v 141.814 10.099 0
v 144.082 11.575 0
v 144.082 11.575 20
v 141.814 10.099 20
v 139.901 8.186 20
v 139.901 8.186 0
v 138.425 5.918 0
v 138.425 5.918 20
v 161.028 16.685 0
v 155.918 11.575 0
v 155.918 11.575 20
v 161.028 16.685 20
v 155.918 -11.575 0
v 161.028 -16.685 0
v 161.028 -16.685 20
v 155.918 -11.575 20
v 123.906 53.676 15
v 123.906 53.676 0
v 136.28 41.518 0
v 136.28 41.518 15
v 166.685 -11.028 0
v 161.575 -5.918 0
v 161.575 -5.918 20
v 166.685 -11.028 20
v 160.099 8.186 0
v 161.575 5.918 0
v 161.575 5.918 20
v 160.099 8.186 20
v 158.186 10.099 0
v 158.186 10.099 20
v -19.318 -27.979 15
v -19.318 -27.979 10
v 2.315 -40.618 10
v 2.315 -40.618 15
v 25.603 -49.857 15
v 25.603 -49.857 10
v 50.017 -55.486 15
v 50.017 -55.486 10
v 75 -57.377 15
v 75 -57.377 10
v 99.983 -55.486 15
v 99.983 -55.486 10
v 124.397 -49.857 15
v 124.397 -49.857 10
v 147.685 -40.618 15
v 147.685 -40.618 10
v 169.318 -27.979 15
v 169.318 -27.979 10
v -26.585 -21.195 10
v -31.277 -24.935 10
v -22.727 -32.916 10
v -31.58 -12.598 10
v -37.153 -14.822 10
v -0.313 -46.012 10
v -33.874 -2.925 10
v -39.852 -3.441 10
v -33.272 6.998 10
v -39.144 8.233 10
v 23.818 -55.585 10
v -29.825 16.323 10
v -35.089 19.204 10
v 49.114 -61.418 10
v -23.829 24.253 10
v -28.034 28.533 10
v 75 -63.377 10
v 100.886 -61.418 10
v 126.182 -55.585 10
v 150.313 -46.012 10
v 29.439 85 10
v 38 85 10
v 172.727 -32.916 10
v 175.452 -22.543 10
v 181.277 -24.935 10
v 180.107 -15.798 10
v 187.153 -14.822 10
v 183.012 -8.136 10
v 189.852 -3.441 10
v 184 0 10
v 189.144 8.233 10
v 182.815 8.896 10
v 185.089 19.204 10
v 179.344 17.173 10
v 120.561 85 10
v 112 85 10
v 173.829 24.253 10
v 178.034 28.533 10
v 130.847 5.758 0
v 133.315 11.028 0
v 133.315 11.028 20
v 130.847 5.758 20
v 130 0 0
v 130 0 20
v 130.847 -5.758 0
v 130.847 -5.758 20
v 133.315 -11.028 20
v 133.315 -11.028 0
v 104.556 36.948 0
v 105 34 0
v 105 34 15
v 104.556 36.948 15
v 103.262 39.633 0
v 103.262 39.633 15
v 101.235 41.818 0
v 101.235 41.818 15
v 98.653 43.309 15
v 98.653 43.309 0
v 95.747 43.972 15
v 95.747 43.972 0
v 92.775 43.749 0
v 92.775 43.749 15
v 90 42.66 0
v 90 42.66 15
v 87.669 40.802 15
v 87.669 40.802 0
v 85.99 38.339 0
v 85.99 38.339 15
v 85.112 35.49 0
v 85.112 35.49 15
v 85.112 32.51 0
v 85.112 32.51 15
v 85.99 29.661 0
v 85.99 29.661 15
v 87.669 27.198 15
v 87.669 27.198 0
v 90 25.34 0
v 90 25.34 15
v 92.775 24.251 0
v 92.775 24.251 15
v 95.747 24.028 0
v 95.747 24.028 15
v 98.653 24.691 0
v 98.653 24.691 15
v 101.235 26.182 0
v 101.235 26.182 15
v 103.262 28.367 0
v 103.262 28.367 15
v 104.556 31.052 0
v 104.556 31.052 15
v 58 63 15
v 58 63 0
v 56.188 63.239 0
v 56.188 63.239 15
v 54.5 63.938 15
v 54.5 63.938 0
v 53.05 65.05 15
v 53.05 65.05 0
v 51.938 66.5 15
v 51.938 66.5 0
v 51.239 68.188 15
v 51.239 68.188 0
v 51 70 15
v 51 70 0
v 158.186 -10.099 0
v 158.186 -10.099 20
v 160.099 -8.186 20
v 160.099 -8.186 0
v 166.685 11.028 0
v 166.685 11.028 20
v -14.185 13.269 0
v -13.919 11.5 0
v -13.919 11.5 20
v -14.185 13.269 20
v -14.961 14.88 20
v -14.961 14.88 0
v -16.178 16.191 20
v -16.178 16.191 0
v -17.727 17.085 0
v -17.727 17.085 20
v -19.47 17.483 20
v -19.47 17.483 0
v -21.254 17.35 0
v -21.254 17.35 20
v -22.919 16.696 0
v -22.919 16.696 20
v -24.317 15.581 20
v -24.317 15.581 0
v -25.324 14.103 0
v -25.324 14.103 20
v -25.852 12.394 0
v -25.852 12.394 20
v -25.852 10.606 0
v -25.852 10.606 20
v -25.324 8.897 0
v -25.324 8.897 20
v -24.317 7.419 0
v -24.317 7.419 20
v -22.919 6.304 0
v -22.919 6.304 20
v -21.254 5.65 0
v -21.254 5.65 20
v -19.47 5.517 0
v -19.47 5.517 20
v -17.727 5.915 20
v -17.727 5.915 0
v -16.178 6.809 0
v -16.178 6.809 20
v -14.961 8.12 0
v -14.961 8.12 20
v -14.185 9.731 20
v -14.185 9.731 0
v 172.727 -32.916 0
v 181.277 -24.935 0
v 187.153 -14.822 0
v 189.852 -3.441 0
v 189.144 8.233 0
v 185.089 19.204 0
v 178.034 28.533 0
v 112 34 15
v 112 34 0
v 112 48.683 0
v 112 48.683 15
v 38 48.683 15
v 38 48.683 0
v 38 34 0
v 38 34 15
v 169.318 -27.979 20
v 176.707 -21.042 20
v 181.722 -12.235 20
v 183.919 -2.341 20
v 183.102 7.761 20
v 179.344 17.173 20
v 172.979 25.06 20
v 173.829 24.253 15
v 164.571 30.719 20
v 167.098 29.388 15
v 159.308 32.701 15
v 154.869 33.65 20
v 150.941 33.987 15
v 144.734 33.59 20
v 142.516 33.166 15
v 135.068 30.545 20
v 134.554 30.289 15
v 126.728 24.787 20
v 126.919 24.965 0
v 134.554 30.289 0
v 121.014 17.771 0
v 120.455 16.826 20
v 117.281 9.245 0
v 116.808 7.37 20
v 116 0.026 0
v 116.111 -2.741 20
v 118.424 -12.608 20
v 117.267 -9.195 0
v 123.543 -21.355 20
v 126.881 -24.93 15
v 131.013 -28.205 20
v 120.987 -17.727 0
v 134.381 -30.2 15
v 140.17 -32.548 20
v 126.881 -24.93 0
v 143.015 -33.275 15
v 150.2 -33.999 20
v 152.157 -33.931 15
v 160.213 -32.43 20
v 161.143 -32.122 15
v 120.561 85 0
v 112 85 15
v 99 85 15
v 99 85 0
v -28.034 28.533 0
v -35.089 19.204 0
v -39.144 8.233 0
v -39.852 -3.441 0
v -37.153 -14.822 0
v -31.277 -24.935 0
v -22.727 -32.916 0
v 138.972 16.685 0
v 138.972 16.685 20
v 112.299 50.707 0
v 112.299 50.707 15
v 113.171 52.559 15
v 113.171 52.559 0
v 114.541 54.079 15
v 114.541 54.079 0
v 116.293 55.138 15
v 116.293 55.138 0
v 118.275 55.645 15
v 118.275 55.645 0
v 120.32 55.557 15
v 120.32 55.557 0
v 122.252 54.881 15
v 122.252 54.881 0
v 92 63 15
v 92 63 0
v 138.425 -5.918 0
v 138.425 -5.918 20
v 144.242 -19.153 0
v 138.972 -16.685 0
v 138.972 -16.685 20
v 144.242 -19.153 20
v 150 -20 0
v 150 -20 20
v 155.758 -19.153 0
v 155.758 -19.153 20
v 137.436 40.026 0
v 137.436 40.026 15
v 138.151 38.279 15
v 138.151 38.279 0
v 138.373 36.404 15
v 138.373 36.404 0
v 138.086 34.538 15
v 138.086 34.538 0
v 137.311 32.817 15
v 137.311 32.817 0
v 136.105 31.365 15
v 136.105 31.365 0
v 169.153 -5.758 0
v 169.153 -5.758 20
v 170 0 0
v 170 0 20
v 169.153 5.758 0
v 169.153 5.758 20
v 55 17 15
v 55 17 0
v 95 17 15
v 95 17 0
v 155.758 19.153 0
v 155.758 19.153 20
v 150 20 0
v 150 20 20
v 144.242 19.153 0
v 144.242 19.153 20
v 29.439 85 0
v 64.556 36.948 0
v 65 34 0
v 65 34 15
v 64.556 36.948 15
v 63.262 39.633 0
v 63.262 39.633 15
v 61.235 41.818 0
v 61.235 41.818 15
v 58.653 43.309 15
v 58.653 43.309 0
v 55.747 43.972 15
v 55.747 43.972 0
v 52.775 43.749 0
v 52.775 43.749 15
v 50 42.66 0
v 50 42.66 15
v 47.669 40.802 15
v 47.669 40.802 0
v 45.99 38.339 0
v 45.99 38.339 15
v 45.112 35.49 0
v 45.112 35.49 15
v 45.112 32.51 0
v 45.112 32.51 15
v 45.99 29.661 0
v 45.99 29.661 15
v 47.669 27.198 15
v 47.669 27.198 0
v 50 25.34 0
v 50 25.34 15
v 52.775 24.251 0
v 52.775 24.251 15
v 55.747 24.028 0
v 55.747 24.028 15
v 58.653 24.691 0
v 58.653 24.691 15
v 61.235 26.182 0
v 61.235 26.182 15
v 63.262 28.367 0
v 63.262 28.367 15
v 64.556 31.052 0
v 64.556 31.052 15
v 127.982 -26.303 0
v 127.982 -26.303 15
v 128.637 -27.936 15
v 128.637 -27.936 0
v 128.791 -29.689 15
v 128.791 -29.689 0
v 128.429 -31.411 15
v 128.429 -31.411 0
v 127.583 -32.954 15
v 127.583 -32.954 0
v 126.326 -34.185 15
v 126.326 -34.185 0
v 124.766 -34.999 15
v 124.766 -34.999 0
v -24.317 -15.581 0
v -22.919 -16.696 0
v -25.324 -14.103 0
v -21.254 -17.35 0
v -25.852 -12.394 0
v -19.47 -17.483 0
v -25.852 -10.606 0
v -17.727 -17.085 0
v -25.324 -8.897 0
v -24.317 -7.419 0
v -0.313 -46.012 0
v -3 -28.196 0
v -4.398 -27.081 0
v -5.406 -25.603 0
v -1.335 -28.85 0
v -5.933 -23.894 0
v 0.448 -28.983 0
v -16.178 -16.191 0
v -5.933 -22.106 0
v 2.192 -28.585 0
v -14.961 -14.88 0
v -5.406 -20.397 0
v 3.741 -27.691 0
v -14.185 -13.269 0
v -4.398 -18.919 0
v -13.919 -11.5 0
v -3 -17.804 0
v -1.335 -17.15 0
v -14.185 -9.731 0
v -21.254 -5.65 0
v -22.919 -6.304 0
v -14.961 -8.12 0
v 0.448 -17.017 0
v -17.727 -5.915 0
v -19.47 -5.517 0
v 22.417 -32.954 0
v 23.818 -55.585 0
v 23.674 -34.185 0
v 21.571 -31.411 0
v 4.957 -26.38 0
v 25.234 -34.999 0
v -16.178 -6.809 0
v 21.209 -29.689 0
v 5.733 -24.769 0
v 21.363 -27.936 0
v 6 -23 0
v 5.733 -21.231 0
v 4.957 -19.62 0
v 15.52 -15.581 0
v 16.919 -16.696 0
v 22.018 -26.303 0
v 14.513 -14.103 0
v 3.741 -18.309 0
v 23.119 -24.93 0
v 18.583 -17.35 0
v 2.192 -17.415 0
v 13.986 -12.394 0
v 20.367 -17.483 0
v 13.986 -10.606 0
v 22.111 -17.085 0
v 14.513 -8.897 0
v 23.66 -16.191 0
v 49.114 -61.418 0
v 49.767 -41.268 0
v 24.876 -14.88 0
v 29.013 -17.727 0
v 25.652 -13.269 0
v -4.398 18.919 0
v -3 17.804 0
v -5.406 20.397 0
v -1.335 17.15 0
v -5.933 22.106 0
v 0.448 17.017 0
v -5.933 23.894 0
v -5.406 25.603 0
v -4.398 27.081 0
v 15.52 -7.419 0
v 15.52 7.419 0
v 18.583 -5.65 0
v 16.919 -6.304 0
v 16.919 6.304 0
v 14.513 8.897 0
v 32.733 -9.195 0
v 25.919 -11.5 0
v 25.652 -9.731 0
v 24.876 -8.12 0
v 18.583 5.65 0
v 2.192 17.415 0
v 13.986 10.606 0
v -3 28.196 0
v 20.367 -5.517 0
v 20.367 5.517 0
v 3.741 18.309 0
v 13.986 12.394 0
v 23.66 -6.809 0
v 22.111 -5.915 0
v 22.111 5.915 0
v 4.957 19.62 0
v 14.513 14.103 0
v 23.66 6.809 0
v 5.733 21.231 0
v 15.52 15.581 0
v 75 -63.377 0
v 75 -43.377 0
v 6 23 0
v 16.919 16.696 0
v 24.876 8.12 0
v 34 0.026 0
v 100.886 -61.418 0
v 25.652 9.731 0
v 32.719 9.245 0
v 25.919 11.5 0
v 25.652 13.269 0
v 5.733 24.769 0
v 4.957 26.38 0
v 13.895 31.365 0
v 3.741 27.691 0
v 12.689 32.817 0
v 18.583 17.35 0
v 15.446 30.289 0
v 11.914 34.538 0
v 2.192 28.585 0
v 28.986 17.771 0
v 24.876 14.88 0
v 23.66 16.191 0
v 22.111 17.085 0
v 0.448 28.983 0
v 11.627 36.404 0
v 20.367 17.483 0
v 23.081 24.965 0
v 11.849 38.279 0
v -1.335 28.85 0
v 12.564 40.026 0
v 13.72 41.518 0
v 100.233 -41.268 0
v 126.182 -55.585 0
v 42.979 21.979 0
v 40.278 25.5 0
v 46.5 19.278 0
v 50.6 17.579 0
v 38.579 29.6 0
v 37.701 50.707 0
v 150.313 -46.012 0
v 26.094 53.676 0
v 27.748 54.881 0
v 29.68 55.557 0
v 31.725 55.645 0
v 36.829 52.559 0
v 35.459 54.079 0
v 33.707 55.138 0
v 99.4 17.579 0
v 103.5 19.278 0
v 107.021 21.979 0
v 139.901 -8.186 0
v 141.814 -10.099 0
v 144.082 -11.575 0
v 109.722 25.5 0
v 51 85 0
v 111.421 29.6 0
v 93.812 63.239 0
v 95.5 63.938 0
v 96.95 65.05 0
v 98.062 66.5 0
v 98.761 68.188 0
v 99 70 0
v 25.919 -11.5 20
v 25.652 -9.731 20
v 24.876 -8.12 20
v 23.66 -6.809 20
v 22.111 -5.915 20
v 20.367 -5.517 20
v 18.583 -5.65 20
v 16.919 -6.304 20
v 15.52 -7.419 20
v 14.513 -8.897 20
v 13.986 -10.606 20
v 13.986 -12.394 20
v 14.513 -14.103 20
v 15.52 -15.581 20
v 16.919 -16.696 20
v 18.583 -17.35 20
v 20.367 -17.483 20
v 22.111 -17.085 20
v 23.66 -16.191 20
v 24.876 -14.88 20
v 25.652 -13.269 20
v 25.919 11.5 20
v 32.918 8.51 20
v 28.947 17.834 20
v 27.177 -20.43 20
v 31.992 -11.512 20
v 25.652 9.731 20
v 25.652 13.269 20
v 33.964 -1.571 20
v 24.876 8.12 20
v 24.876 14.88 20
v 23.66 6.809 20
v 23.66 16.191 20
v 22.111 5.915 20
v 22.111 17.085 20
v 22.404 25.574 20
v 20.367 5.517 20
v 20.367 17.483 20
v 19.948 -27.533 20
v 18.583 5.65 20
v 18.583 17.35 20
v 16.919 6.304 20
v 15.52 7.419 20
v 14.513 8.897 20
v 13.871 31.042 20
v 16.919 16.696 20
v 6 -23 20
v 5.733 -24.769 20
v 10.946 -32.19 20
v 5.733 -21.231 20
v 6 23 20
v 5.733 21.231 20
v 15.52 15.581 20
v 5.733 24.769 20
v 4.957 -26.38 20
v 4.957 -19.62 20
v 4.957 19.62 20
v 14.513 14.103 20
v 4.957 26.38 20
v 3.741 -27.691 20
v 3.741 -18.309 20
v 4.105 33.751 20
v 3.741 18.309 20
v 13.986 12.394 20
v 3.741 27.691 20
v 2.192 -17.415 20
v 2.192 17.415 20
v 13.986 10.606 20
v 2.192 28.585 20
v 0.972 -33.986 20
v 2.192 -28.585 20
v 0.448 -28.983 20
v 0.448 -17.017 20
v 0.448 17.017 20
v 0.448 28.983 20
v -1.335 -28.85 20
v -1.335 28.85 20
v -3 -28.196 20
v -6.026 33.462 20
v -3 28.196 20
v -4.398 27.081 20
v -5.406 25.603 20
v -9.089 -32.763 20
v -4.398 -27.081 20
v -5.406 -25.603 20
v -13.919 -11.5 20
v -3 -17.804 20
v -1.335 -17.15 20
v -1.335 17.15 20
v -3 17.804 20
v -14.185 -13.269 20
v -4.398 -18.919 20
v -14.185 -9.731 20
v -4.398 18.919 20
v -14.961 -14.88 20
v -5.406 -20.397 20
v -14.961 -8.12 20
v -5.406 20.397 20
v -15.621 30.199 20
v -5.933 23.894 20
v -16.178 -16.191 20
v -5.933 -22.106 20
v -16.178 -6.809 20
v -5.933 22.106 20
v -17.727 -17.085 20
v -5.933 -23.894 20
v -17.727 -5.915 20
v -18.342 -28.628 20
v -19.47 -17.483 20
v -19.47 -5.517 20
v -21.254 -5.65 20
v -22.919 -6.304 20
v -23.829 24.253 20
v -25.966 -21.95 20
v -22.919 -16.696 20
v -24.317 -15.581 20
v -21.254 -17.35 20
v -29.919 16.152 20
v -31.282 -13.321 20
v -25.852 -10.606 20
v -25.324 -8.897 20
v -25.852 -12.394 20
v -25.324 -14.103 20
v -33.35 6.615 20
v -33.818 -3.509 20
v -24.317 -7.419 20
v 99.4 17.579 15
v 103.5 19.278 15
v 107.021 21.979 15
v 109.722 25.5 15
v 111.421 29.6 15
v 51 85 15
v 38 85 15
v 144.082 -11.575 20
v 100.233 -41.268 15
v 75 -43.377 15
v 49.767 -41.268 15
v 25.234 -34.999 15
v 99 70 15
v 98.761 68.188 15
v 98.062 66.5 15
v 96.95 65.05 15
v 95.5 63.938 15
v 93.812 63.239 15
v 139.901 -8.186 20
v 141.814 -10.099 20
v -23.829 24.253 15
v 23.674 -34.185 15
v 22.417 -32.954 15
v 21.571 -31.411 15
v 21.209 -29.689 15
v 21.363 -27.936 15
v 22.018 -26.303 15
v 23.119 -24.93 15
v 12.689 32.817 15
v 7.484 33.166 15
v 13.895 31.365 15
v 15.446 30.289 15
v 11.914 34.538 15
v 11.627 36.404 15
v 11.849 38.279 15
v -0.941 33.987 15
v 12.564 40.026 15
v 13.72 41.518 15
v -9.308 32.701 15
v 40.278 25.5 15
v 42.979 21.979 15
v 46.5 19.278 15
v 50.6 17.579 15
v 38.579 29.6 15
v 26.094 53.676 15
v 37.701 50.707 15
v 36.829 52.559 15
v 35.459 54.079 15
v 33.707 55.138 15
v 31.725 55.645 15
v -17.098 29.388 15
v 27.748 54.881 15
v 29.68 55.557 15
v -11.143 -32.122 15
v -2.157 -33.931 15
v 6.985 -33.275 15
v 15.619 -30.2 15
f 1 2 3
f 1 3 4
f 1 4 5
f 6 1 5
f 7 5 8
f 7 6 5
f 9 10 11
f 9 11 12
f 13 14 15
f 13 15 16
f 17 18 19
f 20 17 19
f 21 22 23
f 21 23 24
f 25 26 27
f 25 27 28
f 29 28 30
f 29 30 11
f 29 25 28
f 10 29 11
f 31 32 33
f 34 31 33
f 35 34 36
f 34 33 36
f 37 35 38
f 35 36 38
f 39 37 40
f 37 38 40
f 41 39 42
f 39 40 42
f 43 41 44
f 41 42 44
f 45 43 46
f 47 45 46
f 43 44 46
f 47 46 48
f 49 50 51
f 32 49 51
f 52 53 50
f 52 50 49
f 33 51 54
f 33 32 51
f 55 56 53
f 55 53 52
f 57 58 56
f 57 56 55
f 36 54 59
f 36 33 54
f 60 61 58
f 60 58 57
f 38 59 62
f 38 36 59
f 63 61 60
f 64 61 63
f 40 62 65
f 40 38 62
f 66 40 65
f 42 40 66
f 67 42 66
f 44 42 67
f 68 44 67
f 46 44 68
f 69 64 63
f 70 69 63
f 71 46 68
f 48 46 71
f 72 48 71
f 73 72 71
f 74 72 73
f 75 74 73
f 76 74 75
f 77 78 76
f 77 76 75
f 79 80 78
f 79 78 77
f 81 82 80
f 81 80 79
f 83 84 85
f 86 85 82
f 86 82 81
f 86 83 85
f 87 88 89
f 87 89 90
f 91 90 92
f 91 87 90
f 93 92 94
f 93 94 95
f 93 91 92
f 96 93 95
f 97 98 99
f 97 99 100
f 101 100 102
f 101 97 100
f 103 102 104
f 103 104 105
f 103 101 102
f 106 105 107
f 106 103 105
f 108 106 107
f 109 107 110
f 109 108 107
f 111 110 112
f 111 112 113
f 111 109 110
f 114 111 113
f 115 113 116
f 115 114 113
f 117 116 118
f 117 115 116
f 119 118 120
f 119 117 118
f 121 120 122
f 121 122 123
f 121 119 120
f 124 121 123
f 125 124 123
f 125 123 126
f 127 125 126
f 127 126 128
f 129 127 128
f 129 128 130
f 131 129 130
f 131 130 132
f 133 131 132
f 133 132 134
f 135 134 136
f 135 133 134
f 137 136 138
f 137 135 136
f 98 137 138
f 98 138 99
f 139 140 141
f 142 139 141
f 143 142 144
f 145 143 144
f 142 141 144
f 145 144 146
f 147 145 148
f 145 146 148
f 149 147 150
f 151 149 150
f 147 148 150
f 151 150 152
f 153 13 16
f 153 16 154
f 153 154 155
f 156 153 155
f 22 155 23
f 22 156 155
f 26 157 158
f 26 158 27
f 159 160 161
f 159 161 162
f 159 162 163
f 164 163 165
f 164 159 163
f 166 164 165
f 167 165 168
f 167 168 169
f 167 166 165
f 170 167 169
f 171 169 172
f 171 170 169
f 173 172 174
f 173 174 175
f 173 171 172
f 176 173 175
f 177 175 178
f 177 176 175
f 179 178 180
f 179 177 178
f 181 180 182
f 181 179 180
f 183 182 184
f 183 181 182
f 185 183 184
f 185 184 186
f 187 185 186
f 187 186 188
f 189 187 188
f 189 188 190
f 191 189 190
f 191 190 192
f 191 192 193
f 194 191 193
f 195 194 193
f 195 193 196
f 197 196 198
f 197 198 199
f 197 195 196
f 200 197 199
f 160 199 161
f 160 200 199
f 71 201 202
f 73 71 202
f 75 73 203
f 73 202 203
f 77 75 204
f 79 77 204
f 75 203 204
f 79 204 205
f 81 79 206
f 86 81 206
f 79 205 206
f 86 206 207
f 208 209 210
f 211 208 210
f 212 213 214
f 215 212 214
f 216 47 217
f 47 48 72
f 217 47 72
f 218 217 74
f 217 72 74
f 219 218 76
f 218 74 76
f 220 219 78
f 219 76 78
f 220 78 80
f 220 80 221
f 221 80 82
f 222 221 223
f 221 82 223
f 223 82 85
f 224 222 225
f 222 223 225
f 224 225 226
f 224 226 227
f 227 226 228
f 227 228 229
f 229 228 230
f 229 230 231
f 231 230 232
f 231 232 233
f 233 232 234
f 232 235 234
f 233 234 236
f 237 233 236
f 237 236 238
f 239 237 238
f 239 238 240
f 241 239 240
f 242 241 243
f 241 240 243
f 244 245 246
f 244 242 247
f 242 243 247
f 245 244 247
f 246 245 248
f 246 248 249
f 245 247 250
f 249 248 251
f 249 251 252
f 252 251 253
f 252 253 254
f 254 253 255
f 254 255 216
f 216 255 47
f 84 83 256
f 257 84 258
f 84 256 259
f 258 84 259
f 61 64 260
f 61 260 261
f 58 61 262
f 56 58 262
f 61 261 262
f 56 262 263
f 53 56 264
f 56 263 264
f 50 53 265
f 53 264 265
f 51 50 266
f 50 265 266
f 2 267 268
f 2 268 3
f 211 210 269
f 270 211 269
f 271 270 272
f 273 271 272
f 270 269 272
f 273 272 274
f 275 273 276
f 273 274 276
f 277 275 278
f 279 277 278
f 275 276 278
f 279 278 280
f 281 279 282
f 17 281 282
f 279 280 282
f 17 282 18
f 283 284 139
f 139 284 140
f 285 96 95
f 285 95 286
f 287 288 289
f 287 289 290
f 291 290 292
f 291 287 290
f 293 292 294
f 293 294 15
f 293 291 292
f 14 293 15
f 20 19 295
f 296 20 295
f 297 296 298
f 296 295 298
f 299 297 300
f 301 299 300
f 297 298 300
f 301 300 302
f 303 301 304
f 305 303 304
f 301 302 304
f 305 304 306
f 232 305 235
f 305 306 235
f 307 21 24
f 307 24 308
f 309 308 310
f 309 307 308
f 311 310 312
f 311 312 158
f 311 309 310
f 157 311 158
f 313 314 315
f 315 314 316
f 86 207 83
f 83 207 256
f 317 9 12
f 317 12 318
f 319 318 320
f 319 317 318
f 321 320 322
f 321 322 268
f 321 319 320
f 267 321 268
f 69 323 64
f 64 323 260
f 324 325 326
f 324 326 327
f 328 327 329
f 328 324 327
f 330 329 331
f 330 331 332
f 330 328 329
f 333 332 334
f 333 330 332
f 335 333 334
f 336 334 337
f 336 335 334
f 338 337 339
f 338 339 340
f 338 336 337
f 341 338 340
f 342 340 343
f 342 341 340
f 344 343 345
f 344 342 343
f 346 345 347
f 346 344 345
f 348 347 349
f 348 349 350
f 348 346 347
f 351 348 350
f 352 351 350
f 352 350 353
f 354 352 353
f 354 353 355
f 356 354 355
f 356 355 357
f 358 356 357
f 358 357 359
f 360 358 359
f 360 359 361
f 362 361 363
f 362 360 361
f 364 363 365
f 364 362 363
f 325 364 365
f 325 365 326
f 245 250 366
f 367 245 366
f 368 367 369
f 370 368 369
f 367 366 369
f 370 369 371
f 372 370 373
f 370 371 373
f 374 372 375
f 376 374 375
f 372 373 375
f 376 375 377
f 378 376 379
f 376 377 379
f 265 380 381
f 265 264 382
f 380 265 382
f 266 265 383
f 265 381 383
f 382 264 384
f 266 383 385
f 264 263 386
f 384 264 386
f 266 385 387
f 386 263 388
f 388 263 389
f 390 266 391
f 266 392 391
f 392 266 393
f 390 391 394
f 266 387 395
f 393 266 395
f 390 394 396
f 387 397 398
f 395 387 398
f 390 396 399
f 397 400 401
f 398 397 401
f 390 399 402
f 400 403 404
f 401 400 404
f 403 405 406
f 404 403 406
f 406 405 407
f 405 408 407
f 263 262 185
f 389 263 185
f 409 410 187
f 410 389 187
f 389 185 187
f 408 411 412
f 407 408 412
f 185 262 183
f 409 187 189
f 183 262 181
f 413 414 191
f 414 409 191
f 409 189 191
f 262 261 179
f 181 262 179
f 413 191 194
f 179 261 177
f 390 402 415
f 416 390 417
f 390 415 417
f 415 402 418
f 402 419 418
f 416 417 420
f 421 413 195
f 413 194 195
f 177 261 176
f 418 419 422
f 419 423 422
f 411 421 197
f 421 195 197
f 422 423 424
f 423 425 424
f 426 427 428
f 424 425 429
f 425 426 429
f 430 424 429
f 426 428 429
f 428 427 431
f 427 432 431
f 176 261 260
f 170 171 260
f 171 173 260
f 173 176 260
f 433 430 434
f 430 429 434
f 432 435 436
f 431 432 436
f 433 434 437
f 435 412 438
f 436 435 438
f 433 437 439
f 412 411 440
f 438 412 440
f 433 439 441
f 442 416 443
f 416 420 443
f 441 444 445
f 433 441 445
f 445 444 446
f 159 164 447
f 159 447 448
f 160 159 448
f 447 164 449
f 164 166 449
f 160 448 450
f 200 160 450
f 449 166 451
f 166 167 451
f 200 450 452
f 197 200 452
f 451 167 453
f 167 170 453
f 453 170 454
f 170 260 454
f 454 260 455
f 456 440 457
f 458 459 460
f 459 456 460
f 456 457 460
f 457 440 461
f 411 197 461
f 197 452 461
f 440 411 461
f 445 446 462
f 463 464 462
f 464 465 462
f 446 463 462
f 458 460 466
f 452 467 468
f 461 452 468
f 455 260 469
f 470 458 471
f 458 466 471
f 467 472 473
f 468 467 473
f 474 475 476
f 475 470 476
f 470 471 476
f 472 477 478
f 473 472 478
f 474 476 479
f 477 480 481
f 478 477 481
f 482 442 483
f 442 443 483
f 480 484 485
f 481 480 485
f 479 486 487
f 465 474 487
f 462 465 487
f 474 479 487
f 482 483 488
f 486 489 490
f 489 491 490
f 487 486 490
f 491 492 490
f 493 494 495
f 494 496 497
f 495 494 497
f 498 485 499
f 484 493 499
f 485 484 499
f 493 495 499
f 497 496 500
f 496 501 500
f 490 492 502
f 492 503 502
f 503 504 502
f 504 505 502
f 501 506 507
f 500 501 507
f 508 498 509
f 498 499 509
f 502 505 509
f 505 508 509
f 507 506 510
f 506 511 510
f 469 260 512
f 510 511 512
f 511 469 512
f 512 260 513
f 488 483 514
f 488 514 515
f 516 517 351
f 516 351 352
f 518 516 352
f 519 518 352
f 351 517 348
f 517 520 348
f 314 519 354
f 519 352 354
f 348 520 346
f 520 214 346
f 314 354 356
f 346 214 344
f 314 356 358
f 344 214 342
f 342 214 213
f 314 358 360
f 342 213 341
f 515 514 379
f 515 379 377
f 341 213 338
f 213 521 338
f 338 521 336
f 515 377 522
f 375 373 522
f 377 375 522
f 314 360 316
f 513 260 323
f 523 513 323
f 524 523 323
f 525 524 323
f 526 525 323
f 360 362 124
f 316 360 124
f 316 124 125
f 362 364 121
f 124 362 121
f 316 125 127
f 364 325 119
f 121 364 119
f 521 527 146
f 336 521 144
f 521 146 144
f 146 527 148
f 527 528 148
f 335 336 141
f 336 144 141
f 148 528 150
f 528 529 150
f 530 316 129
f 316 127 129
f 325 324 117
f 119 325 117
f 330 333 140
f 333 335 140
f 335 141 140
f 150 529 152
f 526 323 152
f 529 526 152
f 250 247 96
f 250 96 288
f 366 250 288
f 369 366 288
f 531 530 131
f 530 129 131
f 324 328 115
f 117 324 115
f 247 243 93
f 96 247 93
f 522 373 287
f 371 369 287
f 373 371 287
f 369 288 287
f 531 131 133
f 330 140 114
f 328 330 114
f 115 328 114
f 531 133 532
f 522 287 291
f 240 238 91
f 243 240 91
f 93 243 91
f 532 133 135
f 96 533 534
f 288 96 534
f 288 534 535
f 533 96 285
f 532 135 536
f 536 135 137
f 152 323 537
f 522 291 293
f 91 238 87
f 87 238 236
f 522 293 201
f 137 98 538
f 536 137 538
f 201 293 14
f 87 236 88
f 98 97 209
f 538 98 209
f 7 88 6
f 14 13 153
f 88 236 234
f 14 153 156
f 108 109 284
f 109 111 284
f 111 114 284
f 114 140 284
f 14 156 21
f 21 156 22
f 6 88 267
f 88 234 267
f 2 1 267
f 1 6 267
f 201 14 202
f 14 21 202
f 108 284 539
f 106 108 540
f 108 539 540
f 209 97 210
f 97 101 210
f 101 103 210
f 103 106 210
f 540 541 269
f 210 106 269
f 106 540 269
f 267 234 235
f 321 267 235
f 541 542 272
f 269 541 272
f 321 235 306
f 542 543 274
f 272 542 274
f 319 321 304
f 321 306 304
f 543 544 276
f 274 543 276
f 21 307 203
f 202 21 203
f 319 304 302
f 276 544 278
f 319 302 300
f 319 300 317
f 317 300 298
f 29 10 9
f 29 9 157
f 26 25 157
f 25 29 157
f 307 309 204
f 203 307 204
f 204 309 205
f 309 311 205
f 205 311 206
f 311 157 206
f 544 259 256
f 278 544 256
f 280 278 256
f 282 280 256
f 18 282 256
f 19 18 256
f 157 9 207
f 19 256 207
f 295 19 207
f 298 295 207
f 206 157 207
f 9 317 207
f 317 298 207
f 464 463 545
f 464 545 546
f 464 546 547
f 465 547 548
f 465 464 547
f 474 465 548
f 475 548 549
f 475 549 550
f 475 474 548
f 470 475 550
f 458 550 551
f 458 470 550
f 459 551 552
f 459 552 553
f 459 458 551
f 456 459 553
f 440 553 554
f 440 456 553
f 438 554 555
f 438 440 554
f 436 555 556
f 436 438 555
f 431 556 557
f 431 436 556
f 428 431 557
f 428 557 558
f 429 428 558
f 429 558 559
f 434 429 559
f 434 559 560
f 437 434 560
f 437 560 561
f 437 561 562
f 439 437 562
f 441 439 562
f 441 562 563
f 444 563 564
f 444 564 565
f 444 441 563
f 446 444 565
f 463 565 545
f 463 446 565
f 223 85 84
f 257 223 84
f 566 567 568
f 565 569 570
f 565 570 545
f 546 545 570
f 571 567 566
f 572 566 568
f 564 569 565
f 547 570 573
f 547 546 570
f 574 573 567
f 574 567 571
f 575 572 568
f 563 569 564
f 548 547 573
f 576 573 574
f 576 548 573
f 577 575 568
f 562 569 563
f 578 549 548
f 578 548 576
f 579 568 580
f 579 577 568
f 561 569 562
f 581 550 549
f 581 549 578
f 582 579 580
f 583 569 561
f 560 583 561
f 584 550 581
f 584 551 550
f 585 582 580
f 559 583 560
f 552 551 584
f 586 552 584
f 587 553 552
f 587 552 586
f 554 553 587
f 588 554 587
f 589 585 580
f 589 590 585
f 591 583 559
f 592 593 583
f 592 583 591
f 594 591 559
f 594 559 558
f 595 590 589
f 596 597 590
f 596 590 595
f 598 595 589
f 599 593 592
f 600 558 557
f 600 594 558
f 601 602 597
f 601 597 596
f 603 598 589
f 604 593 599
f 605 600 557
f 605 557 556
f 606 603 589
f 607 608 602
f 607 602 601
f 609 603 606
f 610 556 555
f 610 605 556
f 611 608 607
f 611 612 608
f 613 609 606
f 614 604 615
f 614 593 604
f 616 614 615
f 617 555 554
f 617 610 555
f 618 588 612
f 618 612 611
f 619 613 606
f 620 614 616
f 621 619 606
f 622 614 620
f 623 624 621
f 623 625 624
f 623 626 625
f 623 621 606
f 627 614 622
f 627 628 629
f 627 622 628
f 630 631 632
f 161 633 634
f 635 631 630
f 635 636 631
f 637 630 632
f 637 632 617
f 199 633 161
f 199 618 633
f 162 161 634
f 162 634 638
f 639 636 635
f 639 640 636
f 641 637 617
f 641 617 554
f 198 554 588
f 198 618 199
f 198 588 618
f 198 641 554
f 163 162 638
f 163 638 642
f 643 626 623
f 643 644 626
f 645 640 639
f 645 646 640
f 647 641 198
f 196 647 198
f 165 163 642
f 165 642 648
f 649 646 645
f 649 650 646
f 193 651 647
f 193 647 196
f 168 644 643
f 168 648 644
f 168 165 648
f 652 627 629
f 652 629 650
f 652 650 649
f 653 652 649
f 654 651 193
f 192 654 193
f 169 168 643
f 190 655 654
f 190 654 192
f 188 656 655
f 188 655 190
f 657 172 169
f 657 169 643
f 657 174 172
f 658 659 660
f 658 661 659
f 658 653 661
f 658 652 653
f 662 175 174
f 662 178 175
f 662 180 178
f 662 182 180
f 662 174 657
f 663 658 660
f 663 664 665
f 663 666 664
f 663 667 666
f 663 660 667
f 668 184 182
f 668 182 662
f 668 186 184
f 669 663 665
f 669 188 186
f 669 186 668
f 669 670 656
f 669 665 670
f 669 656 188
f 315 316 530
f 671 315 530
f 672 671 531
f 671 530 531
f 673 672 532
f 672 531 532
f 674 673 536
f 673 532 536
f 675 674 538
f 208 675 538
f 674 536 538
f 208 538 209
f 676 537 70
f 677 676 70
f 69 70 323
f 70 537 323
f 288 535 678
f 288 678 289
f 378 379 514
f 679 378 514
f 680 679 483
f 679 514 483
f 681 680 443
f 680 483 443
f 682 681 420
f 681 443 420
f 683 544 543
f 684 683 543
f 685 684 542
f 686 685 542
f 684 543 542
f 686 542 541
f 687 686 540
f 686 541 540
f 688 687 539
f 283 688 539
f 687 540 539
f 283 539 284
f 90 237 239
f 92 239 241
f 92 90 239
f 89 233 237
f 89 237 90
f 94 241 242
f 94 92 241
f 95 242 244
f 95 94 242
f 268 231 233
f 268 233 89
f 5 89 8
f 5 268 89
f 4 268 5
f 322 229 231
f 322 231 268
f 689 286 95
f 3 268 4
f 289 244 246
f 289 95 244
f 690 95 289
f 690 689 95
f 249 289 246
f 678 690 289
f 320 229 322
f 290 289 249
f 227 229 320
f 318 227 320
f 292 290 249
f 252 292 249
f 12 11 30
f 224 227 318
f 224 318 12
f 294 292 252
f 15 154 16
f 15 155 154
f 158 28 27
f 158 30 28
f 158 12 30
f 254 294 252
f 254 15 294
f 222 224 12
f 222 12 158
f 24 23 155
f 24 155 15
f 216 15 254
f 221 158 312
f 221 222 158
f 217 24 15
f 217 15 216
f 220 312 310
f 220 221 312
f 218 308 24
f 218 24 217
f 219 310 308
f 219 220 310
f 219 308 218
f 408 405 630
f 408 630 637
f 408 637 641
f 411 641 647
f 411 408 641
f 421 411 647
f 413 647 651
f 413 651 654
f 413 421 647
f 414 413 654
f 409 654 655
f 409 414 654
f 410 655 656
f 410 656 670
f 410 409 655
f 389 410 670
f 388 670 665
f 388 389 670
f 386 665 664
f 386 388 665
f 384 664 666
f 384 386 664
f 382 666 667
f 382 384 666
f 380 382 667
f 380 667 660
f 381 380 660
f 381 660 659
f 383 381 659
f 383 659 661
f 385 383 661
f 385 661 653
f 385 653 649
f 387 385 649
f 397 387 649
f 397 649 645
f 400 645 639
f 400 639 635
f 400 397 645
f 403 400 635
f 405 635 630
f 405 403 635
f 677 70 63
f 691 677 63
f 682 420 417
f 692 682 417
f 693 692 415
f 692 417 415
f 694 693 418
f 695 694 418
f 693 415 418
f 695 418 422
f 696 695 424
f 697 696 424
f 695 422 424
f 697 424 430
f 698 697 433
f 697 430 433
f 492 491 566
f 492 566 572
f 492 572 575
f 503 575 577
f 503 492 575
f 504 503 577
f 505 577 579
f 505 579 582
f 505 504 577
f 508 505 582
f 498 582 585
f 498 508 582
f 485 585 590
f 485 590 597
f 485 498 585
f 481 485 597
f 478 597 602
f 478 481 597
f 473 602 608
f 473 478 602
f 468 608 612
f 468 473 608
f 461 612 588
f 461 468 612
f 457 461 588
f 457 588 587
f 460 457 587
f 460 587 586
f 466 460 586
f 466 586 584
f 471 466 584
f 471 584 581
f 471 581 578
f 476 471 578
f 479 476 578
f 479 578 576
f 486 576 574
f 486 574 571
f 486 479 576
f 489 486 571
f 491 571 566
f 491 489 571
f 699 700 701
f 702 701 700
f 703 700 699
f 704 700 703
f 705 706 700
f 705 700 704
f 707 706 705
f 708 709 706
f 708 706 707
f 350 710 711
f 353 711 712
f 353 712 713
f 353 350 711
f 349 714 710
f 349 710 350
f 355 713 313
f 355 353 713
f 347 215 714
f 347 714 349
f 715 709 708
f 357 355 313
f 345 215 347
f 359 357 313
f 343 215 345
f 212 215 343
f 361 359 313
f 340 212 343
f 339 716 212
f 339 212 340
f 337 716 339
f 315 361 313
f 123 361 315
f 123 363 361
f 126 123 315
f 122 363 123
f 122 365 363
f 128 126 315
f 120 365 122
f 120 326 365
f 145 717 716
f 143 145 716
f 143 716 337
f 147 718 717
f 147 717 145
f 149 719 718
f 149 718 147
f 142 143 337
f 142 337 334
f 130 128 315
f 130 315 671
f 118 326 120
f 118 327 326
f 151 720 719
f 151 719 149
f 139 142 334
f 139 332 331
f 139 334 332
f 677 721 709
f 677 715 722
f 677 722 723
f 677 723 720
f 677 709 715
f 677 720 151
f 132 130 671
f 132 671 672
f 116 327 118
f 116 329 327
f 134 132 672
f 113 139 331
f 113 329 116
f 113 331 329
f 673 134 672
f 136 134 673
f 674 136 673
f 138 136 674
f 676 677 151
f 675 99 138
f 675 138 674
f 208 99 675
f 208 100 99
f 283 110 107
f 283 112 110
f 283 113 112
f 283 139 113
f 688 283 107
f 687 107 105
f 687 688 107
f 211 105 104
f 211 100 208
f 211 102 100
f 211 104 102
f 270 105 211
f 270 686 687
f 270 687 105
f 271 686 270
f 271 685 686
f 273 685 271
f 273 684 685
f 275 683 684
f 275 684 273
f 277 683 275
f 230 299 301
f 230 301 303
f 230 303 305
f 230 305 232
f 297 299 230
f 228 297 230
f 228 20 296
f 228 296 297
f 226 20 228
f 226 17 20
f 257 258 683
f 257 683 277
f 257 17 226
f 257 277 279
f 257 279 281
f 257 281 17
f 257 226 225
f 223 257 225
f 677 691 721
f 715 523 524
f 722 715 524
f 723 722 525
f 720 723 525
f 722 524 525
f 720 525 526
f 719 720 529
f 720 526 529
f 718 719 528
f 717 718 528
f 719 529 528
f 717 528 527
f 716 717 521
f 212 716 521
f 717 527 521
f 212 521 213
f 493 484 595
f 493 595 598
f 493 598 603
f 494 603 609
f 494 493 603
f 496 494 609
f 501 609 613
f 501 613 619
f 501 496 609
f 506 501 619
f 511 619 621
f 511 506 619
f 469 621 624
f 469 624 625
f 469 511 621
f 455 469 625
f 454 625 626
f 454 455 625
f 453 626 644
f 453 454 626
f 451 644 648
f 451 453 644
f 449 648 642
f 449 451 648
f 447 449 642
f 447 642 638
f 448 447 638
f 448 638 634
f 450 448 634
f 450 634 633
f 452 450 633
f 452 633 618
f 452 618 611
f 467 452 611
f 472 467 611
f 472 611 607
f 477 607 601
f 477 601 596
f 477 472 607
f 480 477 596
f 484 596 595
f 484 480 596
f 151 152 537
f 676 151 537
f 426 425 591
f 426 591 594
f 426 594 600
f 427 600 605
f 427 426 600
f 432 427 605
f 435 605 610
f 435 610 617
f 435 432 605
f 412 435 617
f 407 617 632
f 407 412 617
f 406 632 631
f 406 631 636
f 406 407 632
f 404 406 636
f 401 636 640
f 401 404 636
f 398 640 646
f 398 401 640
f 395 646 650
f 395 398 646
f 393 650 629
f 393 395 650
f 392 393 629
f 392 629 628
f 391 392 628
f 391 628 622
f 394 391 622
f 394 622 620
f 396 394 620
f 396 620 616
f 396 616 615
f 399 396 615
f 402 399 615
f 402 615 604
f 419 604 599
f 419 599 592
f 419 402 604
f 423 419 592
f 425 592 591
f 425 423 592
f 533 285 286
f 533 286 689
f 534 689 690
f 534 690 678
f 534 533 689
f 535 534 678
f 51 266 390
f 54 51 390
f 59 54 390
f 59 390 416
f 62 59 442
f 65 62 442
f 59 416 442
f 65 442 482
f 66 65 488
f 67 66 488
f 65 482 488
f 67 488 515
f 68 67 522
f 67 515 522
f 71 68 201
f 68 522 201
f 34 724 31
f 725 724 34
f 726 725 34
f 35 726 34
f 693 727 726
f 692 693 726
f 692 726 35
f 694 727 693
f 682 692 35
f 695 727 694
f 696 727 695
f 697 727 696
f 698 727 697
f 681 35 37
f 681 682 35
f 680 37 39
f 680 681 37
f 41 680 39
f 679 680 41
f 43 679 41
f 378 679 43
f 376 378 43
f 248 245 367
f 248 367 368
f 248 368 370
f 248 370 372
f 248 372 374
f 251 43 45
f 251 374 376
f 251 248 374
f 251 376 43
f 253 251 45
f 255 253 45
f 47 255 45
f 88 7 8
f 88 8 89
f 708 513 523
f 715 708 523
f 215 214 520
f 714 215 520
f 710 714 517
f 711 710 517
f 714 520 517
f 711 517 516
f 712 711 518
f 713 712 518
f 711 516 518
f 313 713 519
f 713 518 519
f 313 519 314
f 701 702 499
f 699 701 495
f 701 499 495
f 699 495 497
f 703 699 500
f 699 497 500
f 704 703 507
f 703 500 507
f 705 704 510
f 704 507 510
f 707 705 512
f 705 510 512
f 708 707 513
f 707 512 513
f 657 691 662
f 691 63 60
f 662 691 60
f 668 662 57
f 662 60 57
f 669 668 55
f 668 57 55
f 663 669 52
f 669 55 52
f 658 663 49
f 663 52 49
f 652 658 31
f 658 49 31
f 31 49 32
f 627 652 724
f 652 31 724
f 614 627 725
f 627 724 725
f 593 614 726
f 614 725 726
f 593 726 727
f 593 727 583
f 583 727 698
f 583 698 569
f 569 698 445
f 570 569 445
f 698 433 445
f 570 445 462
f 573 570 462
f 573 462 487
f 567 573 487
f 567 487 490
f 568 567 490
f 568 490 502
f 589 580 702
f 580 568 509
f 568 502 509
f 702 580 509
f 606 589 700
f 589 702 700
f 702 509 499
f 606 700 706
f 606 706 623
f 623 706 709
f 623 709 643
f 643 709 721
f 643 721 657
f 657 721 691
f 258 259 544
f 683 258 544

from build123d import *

# Parameters (mm, degrees)
EXTRUDE_1_DEPTH = 10
SKETCH_1_3_R    = 34
SKETCH_1_3_R_2  = 6
EXTRUDE_2_DEPTH = 20
SKETCH_1_4_R    = 10
EXTRUDE_3_DEPTH = 15


with BuildPart() as part:
    # Эскиз1 → Бобышка-Вытянуть1 (new body)
    with BuildSketch(Plane.XY):
        with BuildLine():
            Line((120.561139783, 85), (112, 85))
            Line((112, 85), (173.82860287, 24.252787165))
            ThreePointArc((173.82860287, 24.252787165), (181.354206237, 13.149667342), (184, 0))
            ThreePointArc((184, 0), (180.106628687, -15.798446414), (169.318181818, -27.97870353))
            ThreePointArc((169.318181818, -27.97870353), (75, -57.376798059), (-19.318181818, -27.97870353))
            ThreePointArc((-19.318181818, -27.97870353), (-33.873934113, -2.92516456), (-23.82860287, 24.252787165))
            Line((-23.82860287, 24.252787165), (38, 85))
            Line((38, 85), (29.438860217, 85))
            Line((29.438860217, 85), (-28.033650435, 28.532690783))
            ThreePointArc((-28.033650435, 28.532690783), (-39.851687192, -3.441370071), (-22.727272727, -32.9161218))
            ThreePointArc((-22.727272727, -32.9161218), (75, -63.376798059), (172.727272727, -32.9161218))
            ThreePointArc((172.727272727, -32.9161218), (189.851687192, -3.441370071), (178.033650435, 28.532690783))
            Line((178.033650435, 28.532690783), (120.561139783, 85))
        make_face()
    extrude(amount=EXTRUDE_1_DEPTH)

    # Эскиз1<3> → Бобышка-Вытянуть2 (add)
    # profile 1 of 2: a face of its own
    with BuildSketch(Plane.XY):
        with Locations((150, 0)):
            Circle(SKETCH_1_3_R)
        with BuildLine():
            ThreePointArc((133.315166415, -11.027979336), (130, 0), (133.315166415, 11.027979336))
            Line((133.315166415, 11.027979336), (138.425145033, 5.918000718))
            ThreePointArc((138.425145033, 5.918000718), (140.807611845, 9.192388155), (144.081999282, 11.574854967))
            Line((144.081999282, 11.574854967), (138.972020664, 16.684833585))
            ThreePointArc((138.972020664, 16.684833585), (150, 20), (161.027979336, 16.684833585))
            Line((161.027979336, 16.684833585), (155.918000718, 11.574854967))
            ThreePointArc((155.918000718, 11.574854967), (159.192388155, 9.192388155), (161.574854967, 5.918000718))
            Line((161.574854967, 5.918000718), (166.684833585, 11.027979336))
            ThreePointArc((166.684833585, 11.027979336), (170, 0), (166.684833585, -11.027979336))
            Line((166.684833585, -11.027979336), (161.574854967, -5.918000718))
            ThreePointArc((161.574854967, -5.918000718), (159.192388155, -9.192388155), (155.918000718, -11.574854967))
            Line((155.918000718, -11.574854967), (161.027979336, -16.684833585))
            ThreePointArc((161.027979336, -16.684833585), (150, -20), (138.972020664, -16.684833585))
            Line((138.972020664, -16.684833585), (144.081999282, -11.574854967))
            ThreePointArc((144.081999282, -11.574854967), (140.807611845, -9.192388155), (138.425145033, -5.918000718))
            Line((138.425145033, -5.918000718), (133.315166415, -11.027979336))
        make_face(mode=Mode.SUBTRACT)
    # profile 2 of 2: a face of its own
    with BuildSketch(Plane.XY):
        Circle(SKETCH_1_3_R)
        with Locations((-19.918584287, -11.5)):
            Circle(SKETCH_1_3_R_2, mode=Mode.SUBTRACT)
        with Locations((0, -23)):
            Circle(SKETCH_1_3_R_2, mode=Mode.SUBTRACT)
        with Locations((19.918584287, -11.5)):
            Circle(SKETCH_1_3_R_2, mode=Mode.SUBTRACT)
        with Locations((-19.918584287, 11.5)):
            Circle(SKETCH_1_3_R_2, mode=Mode.SUBTRACT)
        with Locations((0, 23)):
            Circle(SKETCH_1_3_R_2, mode=Mode.SUBTRACT)
        with Locations((19.918584287, 11.5)):
            Circle(SKETCH_1_3_R_2, mode=Mode.SUBTRACT)
    extrude(amount=EXTRUDE_2_DEPTH)

    # Эскиз1<4> → Бобышка-Вытянуть3 (add)
    # profile 1 of 2: a face of its own
    with BuildSketch(Plane.XY):
        with BuildLine():
            Line((173.82860287, 24.252787165), (112, 85))
            Line((112, 85), (99, 85))
            Line((99, 85), (99, 70))
            ThreePointArc((99, 70), (96.949747468, 65.050252532), (92, 63))
            Line((92, 63), (58, 63))
            ThreePointArc((58, 63), (53.050252532, 65.050252532), (51, 70))
            Line((51, 70), (51, 85))
            Line((51, 85), (38, 85))
            Line((38, 85), (-23.82860287, 24.252787165))
            ThreePointArc((-23.82860287, 24.252787165), (-5.164889991, 33.605414912), (15.445958822, 30.28898077))
            ThreePointArc((15.445958822, 30.28898077), (11.707247274, 35.461587695), (13.720120341, 41.518168286))
            Line((13.720120341, 41.518168286), (26.094111174, 53.675736464))
            ThreePointArc((26.094111174, 53.675736464), (33.707284453, 55.137793332), (38, 48.682515577))
            Line((38, 48.682515577), (38, 34))
            ThreePointArc((38, 34), (42.97918472, 21.97918472), (55, 17))
            Line((55, 17), (95, 17))
            ThreePointArc((95, 17), (107.02081528, 21.97918472), (112, 34))
            Line((112, 34), (112, 48.682515577))
            ThreePointArc((112, 48.682515577), (116.292715547, 55.137793332), (123.905888826, 53.675736464))
            Line((123.905888826, 53.675736464), (136.279879659, 41.518168286))
            ThreePointArc((136.279879659, 41.518168286), (138.292752726, 35.461587695), (134.554041178, 30.28898077))
            ThreePointArc((134.554041178, 30.28898077), (155.164889991, 33.605414912), (173.82860287, 24.252787165))
        make_face()
        with Locations((55, 34)):
            Circle(SKETCH_1_4_R, mode=Mode.SUBTRACT)
        with Locations((95, 34)):
            Circle(SKETCH_1_4_R, mode=Mode.SUBTRACT)
    # profile 2 of 2: a face of its own
    with BuildSketch(Plane.XY):
        with BuildLine():
            ThreePointArc((-19.318181818, -27.97870353), (75, -57.376798059), (169.318181818, -27.97870353))
            ThreePointArc((169.318181818, -27.97870353), (147.563945827, -33.912617712), (126.881190396, -24.930315732))
            ThreePointArc((126.881190396, -24.930315732), (128.673214982, -30.563393481), (124.765841582, -34.999083974))
            ThreePointArc((124.765841582, -34.999083974), (75, -43.376798059), (25.234158418, -34.999083974))
            ThreePointArc((25.234158418, -34.999083974), (21.326785018, -30.563393481), (23.118809604, -24.930315732))
            ThreePointArc((23.118809604, -24.930315732), (2.436054173, -33.912617712), (-19.318181818, -27.97870353))
        make_face()
    extrude(amount=EXTRUDE_3_DEPTH)


solid = part.part
